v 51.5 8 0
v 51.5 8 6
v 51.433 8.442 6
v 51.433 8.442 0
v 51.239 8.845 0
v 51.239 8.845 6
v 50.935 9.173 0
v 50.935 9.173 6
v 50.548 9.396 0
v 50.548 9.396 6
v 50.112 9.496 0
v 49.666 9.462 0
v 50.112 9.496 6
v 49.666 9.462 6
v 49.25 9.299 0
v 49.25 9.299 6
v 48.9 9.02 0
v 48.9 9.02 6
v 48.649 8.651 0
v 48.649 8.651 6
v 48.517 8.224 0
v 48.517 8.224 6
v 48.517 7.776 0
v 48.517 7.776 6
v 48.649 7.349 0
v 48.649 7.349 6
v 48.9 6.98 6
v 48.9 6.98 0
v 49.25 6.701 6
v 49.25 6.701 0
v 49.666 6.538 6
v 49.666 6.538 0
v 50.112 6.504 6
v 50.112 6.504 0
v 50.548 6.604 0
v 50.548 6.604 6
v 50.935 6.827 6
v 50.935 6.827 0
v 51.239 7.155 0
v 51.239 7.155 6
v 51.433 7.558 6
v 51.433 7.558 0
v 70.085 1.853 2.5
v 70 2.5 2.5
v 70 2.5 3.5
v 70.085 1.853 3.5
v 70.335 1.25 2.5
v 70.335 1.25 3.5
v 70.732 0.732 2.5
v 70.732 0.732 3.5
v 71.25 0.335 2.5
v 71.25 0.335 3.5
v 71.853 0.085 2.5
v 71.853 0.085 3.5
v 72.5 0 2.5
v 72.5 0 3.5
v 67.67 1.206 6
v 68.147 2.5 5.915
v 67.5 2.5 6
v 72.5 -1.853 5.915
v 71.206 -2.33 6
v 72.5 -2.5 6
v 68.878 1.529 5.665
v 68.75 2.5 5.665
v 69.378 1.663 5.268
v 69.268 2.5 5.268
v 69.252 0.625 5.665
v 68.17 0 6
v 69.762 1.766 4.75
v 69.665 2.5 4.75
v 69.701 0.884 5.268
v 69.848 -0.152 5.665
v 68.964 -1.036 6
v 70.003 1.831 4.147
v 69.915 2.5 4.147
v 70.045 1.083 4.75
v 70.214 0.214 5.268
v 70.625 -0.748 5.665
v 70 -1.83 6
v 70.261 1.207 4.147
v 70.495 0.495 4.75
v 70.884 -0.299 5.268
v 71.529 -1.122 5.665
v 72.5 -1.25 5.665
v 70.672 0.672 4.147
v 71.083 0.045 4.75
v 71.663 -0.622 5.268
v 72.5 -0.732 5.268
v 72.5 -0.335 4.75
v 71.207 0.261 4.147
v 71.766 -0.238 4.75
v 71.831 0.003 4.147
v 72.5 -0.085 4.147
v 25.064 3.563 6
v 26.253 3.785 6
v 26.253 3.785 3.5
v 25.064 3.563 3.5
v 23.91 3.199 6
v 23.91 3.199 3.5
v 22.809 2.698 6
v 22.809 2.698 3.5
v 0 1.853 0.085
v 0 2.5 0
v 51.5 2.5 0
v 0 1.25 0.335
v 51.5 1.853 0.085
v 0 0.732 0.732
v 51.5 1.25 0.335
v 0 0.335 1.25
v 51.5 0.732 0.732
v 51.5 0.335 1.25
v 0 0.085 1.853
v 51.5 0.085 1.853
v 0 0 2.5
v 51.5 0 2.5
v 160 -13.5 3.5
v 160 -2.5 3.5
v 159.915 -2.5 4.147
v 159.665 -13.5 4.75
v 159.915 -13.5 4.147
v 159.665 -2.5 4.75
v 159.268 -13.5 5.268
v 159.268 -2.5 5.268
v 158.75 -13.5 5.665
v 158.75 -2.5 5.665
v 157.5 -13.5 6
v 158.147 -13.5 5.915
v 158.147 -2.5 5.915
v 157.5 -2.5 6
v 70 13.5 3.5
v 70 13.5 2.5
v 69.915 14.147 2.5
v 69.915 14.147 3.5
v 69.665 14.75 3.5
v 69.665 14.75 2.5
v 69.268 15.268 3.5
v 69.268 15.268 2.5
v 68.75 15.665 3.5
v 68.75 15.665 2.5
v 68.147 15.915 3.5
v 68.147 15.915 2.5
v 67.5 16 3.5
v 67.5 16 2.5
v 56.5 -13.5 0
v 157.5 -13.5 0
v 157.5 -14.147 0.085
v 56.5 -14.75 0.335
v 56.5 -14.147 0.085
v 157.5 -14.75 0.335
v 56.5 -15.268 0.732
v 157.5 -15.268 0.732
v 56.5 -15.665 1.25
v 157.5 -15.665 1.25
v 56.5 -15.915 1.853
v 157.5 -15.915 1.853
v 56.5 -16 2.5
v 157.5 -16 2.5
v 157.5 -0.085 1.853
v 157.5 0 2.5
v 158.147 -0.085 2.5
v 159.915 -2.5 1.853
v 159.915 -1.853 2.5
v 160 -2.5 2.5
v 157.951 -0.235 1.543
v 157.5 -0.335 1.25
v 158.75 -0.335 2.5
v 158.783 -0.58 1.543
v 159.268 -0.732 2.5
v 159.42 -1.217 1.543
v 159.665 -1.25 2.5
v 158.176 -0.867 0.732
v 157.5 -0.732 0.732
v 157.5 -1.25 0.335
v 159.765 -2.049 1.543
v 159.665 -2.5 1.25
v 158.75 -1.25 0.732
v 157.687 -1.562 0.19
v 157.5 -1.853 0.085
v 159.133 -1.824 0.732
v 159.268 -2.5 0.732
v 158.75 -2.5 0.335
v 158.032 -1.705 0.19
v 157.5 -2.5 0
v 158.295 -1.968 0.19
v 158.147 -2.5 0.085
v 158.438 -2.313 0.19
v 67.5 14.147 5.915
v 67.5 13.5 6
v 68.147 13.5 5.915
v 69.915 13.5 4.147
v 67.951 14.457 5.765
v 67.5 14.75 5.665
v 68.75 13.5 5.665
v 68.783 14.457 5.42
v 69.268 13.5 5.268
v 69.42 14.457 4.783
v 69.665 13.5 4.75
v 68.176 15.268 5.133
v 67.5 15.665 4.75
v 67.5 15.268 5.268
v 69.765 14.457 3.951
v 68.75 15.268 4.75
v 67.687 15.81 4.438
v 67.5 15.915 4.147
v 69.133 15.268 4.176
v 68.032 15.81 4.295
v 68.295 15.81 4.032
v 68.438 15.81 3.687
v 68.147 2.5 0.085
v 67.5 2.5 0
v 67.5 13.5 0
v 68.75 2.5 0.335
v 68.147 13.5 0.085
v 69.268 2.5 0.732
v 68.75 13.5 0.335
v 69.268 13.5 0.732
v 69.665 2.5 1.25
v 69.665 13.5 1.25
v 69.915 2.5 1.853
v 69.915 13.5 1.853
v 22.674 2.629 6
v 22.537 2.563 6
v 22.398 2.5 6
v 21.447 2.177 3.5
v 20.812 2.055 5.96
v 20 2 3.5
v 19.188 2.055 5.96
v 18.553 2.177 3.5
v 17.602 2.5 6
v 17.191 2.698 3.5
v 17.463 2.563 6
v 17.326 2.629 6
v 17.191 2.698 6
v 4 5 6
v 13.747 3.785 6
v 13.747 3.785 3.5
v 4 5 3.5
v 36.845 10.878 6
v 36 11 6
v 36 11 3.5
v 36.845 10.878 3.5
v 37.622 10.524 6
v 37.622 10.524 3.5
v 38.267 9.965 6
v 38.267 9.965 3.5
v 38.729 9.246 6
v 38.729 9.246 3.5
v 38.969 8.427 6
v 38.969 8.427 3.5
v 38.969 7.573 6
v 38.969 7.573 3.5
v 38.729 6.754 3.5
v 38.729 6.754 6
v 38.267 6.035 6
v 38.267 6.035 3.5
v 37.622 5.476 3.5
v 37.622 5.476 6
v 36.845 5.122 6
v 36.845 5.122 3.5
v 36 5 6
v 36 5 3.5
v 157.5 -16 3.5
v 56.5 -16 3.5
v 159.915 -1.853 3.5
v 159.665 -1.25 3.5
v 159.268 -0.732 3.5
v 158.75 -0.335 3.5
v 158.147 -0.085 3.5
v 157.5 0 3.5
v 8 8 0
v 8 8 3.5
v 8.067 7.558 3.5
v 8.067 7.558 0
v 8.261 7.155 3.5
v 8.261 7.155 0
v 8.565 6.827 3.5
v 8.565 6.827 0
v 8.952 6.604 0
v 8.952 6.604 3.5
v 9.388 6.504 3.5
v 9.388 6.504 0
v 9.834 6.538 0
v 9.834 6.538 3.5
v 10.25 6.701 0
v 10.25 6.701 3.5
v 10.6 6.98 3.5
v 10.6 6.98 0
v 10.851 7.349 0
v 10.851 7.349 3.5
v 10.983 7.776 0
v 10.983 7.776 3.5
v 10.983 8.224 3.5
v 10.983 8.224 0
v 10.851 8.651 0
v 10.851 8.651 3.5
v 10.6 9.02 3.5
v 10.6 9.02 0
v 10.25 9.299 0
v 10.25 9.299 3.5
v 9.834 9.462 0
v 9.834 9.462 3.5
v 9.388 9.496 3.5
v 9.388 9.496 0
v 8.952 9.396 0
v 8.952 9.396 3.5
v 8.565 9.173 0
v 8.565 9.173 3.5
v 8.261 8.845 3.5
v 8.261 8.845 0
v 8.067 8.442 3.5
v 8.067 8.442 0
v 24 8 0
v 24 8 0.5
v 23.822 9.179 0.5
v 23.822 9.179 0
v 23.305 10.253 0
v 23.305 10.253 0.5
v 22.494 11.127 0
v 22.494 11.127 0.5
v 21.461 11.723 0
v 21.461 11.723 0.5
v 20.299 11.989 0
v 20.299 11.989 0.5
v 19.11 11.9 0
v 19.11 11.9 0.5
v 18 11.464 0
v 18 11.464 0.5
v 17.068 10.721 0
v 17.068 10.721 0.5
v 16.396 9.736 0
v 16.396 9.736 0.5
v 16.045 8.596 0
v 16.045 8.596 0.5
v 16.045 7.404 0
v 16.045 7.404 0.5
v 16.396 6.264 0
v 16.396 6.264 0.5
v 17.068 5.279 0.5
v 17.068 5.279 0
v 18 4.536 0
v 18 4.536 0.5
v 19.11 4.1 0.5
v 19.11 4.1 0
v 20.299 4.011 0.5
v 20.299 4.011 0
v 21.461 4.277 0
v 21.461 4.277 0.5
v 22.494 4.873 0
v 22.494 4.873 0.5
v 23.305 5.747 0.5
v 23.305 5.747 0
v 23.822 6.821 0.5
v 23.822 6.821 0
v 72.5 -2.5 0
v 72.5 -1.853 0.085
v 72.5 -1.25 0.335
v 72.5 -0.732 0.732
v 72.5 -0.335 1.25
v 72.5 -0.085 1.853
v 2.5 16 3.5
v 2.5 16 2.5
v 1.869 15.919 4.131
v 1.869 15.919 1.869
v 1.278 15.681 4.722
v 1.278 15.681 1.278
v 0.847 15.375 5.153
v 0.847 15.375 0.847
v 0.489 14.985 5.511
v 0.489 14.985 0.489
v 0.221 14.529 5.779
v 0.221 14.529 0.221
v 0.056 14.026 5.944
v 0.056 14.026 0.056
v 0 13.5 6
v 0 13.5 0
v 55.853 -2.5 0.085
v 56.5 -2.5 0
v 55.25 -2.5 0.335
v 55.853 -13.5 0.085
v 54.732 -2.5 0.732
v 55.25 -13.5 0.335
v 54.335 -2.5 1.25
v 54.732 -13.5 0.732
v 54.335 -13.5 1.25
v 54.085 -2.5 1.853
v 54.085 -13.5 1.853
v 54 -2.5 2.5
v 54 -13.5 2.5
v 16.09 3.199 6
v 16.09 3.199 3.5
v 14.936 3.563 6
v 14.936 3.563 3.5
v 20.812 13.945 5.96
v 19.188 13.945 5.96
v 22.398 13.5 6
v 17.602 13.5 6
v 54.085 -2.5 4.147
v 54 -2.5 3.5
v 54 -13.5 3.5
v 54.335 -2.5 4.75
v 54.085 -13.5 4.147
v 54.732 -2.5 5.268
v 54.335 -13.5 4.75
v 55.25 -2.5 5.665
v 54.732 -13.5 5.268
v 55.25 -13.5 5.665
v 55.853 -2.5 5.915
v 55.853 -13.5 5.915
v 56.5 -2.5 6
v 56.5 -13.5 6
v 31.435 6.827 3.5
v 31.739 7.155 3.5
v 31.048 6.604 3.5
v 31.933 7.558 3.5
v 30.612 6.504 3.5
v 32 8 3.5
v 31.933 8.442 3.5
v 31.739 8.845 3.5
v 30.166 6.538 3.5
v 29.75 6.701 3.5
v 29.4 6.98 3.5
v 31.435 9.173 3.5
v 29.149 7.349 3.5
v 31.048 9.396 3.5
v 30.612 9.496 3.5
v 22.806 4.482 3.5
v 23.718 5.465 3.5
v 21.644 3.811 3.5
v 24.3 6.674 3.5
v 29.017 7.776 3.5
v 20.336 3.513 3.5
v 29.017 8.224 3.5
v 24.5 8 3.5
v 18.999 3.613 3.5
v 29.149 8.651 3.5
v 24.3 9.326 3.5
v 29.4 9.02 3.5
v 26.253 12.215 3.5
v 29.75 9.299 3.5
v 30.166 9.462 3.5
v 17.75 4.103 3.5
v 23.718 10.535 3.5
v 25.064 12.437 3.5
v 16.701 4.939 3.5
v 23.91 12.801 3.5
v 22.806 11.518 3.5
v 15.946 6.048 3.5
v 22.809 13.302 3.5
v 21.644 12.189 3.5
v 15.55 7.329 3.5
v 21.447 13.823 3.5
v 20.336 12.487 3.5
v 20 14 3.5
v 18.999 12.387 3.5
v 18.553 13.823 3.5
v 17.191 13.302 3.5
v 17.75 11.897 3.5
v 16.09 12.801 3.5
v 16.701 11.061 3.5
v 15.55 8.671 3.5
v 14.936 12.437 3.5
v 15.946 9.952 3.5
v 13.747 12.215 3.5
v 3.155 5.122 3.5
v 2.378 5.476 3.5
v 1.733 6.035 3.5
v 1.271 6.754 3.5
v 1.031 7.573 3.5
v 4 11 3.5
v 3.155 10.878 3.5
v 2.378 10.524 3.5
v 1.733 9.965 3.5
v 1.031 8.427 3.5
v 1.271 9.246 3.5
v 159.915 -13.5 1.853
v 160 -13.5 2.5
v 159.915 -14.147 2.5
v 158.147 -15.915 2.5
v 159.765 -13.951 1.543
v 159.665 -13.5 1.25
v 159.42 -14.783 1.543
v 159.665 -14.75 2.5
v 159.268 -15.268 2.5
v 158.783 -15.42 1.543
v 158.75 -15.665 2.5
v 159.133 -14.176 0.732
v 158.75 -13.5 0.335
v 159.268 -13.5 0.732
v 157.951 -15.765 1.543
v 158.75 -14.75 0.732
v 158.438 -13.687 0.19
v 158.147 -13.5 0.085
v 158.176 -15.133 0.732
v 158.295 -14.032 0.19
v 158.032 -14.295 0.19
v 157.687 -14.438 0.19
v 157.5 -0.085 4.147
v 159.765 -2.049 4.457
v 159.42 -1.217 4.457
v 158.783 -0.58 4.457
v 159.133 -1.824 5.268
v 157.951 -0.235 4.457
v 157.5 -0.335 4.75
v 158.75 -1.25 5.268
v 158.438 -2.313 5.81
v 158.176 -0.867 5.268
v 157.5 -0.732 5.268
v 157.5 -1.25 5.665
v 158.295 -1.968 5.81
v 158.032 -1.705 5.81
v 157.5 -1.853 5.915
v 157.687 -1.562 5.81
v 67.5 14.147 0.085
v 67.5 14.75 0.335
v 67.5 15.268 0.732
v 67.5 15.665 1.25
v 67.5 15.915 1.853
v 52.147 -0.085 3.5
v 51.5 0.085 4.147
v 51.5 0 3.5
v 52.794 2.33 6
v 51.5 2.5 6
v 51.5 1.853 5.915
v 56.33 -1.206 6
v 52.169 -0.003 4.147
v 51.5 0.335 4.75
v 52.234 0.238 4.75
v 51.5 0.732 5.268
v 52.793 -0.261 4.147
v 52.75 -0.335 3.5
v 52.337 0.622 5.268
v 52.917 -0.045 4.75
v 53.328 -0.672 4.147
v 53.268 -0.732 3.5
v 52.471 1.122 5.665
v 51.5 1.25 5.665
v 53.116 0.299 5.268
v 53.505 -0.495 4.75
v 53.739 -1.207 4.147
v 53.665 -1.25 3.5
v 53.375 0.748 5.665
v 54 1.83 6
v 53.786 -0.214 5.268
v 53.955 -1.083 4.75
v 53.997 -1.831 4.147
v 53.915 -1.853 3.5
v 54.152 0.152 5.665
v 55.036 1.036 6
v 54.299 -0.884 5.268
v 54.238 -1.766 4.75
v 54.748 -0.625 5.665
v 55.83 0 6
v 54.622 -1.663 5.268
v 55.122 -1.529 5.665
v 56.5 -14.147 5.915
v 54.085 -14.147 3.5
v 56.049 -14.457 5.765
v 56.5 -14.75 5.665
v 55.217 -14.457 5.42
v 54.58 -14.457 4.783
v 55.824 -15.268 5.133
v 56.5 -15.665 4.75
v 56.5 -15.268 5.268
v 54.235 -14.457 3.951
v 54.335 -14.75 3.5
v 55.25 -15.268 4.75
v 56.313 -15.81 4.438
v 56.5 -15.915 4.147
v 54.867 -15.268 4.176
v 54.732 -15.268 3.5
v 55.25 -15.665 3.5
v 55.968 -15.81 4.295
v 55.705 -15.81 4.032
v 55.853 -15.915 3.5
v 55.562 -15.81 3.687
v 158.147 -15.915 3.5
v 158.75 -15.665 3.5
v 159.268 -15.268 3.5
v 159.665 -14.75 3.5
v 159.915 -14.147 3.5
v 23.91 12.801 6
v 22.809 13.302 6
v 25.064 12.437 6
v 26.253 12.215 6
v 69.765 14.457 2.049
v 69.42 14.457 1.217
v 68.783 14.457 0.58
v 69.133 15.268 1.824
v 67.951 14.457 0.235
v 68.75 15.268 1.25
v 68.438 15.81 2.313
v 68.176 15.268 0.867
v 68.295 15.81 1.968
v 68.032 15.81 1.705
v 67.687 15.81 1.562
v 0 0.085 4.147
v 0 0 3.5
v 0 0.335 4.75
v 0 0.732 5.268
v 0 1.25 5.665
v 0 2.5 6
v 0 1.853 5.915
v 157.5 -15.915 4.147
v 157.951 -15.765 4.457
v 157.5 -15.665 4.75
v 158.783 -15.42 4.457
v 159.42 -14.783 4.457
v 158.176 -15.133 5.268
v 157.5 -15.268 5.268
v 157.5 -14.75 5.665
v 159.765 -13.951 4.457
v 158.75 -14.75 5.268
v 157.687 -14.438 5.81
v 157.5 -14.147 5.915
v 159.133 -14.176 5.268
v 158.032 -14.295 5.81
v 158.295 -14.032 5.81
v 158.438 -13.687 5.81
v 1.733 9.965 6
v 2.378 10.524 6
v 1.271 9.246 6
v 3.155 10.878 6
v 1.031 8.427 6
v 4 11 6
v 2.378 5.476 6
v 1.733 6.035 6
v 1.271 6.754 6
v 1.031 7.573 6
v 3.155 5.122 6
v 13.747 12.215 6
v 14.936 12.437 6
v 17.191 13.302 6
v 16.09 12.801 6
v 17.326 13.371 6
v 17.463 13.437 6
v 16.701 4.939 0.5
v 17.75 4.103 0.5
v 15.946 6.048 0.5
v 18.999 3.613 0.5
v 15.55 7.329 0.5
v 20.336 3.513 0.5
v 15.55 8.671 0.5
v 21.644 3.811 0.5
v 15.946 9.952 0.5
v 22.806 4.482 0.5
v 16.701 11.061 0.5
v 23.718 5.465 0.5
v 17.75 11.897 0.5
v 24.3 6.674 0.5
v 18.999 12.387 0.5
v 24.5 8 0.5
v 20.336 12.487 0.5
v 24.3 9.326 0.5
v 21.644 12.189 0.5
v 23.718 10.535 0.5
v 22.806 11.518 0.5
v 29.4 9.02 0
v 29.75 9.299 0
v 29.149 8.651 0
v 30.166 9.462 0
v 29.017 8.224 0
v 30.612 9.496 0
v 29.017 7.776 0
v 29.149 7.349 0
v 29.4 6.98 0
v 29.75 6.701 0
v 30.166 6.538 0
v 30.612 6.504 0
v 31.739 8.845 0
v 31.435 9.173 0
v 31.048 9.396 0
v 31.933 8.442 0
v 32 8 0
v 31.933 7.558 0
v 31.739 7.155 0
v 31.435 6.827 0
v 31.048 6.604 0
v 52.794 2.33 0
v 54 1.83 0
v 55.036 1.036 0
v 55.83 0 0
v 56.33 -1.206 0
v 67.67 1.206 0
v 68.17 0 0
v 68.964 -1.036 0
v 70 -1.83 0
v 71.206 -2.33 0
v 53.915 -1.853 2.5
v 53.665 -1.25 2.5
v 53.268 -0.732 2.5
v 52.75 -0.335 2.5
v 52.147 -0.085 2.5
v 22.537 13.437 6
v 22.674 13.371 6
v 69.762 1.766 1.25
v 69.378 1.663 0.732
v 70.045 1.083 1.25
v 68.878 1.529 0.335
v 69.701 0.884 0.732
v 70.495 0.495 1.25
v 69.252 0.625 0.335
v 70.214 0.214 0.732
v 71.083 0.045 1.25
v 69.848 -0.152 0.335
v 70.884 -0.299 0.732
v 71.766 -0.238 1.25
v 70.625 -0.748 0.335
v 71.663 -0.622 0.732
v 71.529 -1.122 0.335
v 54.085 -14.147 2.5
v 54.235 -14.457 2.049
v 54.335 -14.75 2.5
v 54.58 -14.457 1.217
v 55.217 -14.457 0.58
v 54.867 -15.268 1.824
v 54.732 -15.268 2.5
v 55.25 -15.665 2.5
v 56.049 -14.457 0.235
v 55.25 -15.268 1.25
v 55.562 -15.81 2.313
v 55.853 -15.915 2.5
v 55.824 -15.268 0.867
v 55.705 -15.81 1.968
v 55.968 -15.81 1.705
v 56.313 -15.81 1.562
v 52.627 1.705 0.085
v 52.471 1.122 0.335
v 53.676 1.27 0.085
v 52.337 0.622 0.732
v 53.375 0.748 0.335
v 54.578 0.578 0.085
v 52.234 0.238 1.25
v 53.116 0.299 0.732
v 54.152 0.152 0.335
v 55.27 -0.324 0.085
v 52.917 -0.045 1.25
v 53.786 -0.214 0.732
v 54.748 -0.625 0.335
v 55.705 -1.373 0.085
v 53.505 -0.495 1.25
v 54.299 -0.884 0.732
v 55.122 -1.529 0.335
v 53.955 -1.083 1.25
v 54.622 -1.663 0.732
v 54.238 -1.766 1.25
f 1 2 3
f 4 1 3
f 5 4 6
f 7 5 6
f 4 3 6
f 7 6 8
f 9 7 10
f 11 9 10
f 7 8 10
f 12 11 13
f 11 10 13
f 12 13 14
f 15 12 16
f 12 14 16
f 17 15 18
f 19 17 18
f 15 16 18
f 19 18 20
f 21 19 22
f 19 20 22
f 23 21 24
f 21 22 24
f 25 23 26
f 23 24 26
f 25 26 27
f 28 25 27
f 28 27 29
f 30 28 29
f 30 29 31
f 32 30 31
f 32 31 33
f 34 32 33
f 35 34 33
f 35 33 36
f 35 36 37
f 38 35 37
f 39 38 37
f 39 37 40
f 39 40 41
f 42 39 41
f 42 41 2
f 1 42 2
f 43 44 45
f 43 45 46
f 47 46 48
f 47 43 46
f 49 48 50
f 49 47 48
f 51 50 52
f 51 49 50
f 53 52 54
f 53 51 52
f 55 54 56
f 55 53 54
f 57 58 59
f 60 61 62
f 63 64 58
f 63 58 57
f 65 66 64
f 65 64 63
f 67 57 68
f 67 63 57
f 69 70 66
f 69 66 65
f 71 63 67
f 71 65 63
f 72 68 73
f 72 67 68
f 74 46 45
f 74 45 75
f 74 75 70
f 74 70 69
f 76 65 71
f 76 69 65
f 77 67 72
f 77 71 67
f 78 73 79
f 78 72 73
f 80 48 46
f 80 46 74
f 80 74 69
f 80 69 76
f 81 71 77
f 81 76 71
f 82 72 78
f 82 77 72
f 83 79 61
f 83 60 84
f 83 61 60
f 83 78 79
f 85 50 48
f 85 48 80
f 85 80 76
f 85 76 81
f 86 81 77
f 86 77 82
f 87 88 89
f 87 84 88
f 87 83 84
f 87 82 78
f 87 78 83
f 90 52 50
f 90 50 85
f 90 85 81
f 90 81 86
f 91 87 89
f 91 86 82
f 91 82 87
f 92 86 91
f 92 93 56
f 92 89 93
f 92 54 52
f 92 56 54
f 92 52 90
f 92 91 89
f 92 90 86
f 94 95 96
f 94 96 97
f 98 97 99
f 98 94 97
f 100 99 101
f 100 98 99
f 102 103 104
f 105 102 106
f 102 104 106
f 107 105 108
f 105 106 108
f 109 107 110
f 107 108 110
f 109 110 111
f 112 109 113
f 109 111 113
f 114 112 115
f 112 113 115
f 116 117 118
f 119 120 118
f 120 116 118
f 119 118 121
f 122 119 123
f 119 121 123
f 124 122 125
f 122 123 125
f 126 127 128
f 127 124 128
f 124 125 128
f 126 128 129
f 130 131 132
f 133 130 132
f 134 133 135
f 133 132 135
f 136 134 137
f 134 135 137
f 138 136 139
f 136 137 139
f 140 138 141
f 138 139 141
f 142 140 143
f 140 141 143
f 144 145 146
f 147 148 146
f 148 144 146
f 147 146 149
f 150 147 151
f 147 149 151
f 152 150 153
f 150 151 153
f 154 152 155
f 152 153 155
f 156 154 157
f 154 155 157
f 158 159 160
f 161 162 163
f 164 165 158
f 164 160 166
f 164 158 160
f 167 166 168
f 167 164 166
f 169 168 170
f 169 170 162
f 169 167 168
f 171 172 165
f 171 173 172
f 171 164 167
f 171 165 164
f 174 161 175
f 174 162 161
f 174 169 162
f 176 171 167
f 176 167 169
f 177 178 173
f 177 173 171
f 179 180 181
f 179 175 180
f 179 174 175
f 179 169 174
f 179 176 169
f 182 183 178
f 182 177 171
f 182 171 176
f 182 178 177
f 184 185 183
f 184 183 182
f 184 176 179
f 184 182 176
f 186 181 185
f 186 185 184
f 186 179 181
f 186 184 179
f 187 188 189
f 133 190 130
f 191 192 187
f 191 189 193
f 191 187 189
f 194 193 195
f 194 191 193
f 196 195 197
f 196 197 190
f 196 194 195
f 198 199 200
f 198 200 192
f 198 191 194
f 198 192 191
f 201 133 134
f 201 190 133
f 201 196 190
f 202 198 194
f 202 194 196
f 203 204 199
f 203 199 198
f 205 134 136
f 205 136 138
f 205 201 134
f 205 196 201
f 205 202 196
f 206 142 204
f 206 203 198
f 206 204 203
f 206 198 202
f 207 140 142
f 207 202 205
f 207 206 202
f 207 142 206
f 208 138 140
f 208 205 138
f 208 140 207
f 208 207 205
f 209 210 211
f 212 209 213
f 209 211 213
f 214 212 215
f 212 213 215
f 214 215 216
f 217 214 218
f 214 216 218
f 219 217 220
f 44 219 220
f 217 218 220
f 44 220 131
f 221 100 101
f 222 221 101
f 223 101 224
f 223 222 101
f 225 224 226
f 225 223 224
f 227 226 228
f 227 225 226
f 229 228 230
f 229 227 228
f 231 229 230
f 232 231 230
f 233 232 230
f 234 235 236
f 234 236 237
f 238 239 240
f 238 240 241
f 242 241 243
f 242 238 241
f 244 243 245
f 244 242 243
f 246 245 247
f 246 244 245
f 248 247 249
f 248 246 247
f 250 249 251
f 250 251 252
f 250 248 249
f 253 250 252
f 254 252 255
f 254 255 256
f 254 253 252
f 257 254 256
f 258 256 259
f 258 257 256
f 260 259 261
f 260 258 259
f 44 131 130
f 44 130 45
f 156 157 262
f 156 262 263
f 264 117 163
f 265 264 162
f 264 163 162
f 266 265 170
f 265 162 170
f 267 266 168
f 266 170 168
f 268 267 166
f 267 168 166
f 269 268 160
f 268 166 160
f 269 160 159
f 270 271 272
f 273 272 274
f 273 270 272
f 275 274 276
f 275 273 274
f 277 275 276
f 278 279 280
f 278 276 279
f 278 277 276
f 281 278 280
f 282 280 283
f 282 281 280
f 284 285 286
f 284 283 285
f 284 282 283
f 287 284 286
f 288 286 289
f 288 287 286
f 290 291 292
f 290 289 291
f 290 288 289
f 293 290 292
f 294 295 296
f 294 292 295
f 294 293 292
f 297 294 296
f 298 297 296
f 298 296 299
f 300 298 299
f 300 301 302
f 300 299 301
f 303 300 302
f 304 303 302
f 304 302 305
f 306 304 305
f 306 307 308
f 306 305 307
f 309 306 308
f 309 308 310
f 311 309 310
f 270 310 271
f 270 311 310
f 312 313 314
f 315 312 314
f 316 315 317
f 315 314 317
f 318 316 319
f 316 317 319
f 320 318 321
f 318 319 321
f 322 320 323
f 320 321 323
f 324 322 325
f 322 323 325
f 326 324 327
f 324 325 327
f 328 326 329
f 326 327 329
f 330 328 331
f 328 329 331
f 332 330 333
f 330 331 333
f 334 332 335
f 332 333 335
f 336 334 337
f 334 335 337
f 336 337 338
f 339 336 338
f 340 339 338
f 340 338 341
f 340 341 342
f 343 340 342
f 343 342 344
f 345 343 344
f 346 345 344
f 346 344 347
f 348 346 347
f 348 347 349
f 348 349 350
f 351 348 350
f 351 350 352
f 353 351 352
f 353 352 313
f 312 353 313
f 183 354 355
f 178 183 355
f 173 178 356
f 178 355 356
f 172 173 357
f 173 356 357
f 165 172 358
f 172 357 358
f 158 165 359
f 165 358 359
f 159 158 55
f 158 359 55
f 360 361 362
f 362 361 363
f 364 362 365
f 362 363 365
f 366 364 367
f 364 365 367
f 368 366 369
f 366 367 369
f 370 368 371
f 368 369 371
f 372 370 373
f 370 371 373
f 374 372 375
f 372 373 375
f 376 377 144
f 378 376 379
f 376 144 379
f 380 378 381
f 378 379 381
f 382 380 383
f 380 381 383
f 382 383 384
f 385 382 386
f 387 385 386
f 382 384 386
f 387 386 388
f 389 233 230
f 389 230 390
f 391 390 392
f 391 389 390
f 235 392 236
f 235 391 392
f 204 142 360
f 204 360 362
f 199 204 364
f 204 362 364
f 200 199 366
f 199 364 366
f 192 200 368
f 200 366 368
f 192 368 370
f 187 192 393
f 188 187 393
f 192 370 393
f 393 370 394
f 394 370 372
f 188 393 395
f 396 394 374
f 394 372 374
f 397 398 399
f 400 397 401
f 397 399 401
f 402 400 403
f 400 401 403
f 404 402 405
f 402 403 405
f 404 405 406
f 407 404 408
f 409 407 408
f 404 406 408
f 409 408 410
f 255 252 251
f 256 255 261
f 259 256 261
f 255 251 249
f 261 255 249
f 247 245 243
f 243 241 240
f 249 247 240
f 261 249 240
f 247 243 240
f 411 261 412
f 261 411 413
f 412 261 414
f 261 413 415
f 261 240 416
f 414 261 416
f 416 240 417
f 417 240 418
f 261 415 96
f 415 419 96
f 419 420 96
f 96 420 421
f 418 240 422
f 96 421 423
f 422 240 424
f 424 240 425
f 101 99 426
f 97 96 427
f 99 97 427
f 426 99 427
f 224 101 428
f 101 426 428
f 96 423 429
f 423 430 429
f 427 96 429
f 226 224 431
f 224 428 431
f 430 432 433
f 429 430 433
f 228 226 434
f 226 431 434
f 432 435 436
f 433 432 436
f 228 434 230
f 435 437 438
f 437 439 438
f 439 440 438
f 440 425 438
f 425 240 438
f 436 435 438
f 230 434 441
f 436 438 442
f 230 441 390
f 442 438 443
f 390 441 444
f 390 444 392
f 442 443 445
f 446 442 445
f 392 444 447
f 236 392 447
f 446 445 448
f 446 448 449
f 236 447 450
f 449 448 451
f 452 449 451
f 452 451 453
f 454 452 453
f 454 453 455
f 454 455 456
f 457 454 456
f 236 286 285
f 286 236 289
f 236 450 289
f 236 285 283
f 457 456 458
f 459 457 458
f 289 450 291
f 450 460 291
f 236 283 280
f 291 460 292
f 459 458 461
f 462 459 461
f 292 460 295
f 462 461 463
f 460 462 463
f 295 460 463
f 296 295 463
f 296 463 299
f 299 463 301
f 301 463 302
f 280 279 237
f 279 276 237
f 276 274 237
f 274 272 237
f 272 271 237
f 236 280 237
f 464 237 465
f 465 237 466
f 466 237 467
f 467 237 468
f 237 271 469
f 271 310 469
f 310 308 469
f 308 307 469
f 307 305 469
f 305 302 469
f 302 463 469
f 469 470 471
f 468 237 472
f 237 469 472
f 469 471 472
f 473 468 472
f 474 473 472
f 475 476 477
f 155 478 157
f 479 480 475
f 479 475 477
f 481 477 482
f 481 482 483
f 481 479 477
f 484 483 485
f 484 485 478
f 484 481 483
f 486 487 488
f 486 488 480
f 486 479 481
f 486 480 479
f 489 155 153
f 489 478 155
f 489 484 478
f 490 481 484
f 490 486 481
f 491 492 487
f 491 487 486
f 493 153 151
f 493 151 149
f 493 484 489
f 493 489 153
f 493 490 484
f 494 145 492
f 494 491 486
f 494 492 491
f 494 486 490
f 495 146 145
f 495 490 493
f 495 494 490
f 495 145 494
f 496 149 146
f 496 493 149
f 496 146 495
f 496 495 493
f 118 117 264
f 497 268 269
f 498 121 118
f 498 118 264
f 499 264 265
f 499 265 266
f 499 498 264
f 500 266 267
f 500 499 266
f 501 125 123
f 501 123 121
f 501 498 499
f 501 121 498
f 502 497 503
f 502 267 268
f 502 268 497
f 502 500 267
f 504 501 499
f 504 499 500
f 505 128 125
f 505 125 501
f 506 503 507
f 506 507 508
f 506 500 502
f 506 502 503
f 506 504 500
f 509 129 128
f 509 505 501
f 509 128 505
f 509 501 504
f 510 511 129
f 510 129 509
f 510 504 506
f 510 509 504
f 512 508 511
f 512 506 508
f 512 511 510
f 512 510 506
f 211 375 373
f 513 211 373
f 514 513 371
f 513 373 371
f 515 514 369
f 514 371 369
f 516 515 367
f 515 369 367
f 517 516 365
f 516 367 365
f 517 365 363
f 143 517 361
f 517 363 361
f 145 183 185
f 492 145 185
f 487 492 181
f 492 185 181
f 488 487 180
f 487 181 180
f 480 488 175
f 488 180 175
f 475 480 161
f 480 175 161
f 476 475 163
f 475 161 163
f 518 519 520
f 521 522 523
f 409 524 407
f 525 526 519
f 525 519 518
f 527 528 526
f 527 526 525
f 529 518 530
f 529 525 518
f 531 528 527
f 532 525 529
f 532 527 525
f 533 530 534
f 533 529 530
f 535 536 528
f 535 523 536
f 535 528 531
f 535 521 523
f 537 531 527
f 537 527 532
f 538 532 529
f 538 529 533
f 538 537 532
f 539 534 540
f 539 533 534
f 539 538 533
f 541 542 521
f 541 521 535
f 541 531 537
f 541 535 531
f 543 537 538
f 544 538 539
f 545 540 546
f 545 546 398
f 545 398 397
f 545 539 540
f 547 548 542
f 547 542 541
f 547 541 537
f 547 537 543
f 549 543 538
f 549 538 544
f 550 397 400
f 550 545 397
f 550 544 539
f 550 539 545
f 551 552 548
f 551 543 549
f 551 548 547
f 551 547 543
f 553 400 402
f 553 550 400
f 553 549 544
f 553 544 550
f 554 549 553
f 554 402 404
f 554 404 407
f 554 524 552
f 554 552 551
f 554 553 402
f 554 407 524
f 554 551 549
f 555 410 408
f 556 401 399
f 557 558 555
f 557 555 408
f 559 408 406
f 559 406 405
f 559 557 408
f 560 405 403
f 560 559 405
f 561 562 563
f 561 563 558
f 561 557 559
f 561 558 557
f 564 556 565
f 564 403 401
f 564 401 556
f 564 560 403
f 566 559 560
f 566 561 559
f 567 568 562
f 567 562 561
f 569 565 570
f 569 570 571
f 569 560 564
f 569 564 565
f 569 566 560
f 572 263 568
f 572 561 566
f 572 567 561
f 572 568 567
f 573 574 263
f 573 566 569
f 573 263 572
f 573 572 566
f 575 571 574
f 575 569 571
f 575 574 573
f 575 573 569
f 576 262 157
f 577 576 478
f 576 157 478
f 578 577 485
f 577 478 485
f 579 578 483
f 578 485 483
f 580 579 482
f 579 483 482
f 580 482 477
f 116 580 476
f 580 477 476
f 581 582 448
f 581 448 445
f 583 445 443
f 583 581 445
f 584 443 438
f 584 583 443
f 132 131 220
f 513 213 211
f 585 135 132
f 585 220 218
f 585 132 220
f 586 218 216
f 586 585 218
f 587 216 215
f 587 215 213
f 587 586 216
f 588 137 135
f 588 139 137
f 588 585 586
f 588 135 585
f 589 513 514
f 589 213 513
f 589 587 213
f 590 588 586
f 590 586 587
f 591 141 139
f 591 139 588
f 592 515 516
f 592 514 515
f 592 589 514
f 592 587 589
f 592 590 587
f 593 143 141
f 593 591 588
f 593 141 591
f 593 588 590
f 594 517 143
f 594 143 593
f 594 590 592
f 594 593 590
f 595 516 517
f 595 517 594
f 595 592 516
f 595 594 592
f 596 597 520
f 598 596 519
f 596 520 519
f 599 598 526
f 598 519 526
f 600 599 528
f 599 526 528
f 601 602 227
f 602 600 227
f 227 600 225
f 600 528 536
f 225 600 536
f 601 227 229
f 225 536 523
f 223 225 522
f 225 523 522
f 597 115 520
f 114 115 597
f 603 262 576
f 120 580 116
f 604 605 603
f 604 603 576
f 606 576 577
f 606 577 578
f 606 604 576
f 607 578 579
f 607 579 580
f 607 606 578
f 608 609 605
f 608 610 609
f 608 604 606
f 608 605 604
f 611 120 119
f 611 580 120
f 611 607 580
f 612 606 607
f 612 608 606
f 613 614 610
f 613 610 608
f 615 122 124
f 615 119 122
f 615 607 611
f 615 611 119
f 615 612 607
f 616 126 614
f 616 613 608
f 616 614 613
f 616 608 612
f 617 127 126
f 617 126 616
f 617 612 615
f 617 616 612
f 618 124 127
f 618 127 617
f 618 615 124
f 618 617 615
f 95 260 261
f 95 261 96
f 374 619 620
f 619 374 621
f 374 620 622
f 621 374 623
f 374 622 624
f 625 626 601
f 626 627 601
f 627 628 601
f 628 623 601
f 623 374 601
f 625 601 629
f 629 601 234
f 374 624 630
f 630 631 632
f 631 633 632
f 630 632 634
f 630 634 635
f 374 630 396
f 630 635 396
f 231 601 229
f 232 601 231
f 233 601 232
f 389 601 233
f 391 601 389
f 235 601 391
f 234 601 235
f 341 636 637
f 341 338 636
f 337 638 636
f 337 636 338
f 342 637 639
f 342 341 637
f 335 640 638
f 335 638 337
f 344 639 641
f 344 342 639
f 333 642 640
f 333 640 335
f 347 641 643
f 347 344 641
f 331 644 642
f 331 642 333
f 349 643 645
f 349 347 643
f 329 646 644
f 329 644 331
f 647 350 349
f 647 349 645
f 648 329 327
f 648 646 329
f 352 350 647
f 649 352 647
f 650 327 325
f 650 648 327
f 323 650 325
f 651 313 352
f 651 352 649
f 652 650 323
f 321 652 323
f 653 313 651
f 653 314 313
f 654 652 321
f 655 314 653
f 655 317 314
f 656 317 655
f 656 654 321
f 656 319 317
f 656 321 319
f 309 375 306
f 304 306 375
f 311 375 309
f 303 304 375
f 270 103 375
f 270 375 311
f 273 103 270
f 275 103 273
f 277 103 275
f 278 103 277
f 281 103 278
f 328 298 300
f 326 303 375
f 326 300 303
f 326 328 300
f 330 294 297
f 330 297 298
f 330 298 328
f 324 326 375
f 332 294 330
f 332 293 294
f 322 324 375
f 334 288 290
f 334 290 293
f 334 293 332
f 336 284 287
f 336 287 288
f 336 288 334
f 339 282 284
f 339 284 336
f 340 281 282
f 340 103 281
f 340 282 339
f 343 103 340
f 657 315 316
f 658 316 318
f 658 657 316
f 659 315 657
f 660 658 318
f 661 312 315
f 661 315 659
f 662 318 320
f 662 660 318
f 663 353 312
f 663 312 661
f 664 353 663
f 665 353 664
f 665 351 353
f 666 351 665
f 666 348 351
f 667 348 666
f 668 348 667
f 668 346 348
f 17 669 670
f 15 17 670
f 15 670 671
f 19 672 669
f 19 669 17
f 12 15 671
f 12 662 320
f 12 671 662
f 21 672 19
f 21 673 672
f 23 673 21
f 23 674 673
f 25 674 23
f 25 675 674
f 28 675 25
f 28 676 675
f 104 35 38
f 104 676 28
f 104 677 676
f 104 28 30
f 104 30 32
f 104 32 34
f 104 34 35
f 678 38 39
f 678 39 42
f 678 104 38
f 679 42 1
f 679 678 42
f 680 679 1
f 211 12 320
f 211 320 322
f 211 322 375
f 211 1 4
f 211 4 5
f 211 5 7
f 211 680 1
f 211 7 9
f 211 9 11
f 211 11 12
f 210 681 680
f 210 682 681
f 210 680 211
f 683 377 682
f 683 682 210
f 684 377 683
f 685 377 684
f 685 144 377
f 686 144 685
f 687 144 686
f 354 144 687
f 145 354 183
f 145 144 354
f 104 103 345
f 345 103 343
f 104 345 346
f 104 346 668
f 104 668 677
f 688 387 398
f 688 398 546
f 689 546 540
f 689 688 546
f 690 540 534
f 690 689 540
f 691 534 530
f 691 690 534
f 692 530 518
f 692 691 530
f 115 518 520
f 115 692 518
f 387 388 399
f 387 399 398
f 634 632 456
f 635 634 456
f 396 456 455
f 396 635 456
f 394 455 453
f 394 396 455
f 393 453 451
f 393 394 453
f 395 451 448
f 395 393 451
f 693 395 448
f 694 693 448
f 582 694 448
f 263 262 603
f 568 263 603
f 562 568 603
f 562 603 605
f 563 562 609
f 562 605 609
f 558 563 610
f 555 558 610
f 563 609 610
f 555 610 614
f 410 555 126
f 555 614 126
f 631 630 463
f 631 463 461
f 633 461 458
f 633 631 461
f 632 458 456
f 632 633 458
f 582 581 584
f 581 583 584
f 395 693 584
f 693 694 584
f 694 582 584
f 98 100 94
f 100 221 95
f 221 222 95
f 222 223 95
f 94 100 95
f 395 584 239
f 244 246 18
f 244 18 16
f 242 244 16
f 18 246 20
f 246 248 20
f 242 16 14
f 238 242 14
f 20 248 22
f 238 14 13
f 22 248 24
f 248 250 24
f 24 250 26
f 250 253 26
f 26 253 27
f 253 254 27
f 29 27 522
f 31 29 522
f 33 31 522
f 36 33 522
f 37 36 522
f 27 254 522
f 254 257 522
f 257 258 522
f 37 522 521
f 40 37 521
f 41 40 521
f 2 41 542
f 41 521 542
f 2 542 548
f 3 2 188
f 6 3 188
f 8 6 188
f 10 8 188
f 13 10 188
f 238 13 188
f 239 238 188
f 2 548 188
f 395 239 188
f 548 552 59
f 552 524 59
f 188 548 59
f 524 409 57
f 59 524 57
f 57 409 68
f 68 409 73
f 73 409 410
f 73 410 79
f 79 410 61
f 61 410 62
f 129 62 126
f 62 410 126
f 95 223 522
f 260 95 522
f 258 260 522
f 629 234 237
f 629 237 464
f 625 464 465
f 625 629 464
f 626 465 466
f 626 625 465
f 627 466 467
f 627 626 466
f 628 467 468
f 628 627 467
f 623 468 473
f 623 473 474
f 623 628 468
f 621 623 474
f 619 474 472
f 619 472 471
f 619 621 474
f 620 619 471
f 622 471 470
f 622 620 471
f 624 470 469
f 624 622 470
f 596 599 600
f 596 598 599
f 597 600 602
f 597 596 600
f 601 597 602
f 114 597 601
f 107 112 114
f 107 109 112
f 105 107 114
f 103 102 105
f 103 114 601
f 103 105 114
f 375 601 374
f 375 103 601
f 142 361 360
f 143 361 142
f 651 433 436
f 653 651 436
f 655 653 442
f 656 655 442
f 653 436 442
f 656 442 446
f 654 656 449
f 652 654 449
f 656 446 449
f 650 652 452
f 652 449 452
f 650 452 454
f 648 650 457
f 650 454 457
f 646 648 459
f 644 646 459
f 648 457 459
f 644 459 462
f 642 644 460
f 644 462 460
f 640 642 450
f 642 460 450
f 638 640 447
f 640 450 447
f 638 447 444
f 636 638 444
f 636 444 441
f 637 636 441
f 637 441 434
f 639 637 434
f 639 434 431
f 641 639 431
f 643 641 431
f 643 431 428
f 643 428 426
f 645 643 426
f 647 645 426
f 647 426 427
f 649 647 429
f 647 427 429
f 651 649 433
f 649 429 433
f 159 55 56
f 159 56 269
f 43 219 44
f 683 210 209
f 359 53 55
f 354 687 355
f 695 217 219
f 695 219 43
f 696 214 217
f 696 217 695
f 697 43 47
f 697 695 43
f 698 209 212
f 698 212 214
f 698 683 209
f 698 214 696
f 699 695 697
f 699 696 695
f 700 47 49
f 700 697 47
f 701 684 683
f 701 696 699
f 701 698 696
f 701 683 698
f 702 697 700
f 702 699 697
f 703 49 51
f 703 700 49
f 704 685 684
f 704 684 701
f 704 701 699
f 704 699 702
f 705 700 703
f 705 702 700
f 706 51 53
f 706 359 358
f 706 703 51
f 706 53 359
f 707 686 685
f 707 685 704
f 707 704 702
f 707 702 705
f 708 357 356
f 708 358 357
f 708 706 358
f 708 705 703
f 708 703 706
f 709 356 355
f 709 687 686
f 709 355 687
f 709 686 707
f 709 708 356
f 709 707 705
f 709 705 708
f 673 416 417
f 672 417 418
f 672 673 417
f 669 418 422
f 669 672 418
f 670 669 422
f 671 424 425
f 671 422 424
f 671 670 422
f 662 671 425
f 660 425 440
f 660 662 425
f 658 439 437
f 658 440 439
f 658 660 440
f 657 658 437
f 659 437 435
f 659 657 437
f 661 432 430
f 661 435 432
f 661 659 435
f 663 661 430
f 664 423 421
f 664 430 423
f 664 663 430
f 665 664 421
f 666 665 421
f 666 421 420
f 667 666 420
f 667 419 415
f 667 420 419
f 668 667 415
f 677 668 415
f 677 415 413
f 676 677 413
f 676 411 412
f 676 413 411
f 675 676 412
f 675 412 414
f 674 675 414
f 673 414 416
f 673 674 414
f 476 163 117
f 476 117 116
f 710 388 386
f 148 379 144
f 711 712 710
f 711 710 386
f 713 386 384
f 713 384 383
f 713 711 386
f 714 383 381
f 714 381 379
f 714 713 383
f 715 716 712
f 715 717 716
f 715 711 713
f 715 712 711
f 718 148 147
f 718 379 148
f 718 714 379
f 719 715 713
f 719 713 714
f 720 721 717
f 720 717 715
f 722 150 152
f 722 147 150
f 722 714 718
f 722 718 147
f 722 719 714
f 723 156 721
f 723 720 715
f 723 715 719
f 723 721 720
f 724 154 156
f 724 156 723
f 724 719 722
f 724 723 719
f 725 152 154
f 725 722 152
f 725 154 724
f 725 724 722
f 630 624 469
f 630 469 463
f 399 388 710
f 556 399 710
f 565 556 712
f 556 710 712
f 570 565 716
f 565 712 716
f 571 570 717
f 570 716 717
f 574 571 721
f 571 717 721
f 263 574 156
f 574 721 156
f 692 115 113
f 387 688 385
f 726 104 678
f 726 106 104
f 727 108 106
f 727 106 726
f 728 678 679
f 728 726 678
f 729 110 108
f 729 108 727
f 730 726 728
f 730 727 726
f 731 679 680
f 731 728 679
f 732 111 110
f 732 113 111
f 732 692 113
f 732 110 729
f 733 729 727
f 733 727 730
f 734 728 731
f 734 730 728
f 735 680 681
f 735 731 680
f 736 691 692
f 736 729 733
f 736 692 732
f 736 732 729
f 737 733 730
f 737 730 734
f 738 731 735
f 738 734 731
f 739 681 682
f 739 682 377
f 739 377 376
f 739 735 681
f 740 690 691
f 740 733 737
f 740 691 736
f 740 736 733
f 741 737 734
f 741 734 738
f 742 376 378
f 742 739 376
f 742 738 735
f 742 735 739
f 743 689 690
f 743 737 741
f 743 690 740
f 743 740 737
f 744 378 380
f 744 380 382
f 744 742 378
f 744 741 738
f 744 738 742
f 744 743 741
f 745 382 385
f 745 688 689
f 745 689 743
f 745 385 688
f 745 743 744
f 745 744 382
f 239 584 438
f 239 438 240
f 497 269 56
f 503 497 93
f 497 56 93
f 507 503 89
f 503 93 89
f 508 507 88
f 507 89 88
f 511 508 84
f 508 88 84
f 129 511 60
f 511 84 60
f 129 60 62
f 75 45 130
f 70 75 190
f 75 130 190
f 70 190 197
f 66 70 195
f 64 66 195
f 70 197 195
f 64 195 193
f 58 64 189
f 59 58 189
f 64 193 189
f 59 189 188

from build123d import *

# Parameters (mm, degrees)
SKETCH_1_R          = 1.5
EXTRUDE_1_DEPTH     = 6
CUT_EXTRUDE_3_DEPTH = 2.5
SKETCH_5_R          = 4.5
CUT_EXTRUDE_4_DEPTH = 3
SKETCH_6_R          = 4
CUT_EXTRUDE_5_DEPTH = 3
SKETCH_7_R          = 1.5
CUT_EXTRUDE_6_DEPTH = 43
FILLET_1_R          = 2.5
FILLET_2_R          = 2.5


with BuildPart() as part:
    # Эскиз1 → Бобышка-Вытянуть1 (new body)
    with BuildSketch(Plane.XY):
        Polygon((0, 0), (0, 16), (70, 16), (70, 0), (160, 0), (160, -16), (54, -16), (54, 0), align=None)
        with Locations((20, 8)):
            Circle(SKETCH_1_R, mode=Mode.SUBTRACT)
        with Locations((30.5, 8)):
            Circle(SKETCH_1_R, mode=Mode.SUBTRACT)
        with Locations(Location((9.5, 8, 0), (0, 0, 180))):
            Circle(SKETCH_1_R, mode=Mode.SUBTRACT)
    extrude(amount=EXTRUDE_1_DEPTH)

    # Эскиз4 → Вырез-Вытянуть3 (cut)
    with BuildSketch(Plane.XY.offset(6)):
        with BuildLine():
            Line((4, 11), (13.746665091, 12.215156208))
            ThreePointArc((13.746665091, 12.215156208), (15.51833306, 12.60172211), (17.191063441, 13.301874707))
            ThreePointArc((17.191063441, 13.301874707), (20, 14), (22.808936559, 13.301874707))
            ThreePointArc((22.808936559, 13.301874707), (24.48166694, 12.60172211), (26.253334909, 12.215156208))
            Line((26.253334909, 12.215156208), (36, 11))
            ThreePointArc((36, 11), (39, 8), (36, 5))
            Line((36, 5), (26.253334909, 3.784843792))
            ThreePointArc((26.253334909, 3.784843792), (24.48166694, 3.39827789), (22.808936559, 2.698125293))
            ThreePointArc((22.808936559, 2.698125293), (20, 2), (17.191063441, 2.698125293))
            ThreePointArc((17.191063441, 2.698125293), (15.51833306, 3.39827789), (13.746665091, 3.784843792))
            Line((13.746665091, 3.784843792), (4, 5))
            ThreePointArc((4, 5), (1, 8), (4, 11))
        make_face()
    extrude(amount=-CUT_EXTRUDE_3_DEPTH, mode=Mode.SUBTRACT)

    # Эскиз5 → Вырез-Вытянуть4 (cut)
    with BuildSketch(Plane.XY.offset(3.5)):
        with Locations((20, 8)):
            Circle(SKETCH_5_R)
    extrude(amount=-CUT_EXTRUDE_4_DEPTH, mode=Mode.SUBTRACT)

    # Эскиз6 → Вырез-Вытянуть5 (cut)
    with BuildSketch(Plane.XY.offset(0.5)):
        with Locations((20, 8)):
            Circle(SKETCH_6_R)
    extrude(amount=-CUT_EXTRUDE_5_DEPTH, mode=Mode.SUBTRACT)

    # Эскиз7 → Вырез-Вытянуть6 (cut)
    with BuildSketch(Plane.XY.offset(6)):
        with Locations((50, 8)):
            Circle(SKETCH_7_R)
        with Locations((80, 8)):
            Circle(SKETCH_7_R)
        with Locations((110, 8)):
            Circle(SKETCH_7_R)
        with Locations((140, 8)):
            Circle(SKETCH_7_R)
        with Locations((170, 8)):
            Circle(SKETCH_7_R)
    extrude(amount=-CUT_EXTRUDE_6_DEPTH, mode=Mode.SUBTRACT)

    # Скругление1
    # the kernel refuses this fillet: 2.5 mm, written as the material it adds along each edge
    with BuildSketch(Plane(origin=(70, 0, 0), x_dir=(0, 1, 0), z_dir=(0, 0, 1))) as fillet_1_piece_1:
        with BuildLine():
            CenterArc((FILLET_1_R, -FILLET_1_R), FILLET_1_R, 90, 90)
            Line((0, -FILLET_1_R), (0, 0))
            Line((0, 0), (FILLET_1_R, 0))
        make_face()
    extrude(amount=6)
    with BuildSketch(Plane(origin=(54, 0, 0), x_dir=(-1, 0, 0), z_dir=(0, 0, 1))) as fillet_1_piece_2:
        with BuildLine():
            CenterArc((FILLET_1_R, FILLET_1_R), FILLET_1_R, 180, 90)
            Line((0, FILLET_1_R), (0, 0))
            Line((0, 0), (FILLET_1_R, 0))
        make_face()
    extrude(amount=6)
    # the kernel refuses this fillet: 2.5 mm, written as the material it takes off along each edge
    with BuildSketch(Plane(origin=(56.5, -13.5, 2.5), x_dir=(0, 0, -1), z_dir=(0, -1, 0))) as fillet_1_2_piece_1_section:
        Polygon((0, 0), (FILLET_1_R, 0), (FILLET_1_R, -FILLET_1_R), (0, -FILLET_1_R), align=None)
    fillet_1_2_piece_1 = extrude(amount=FILLET_1_R, mode=Mode.PRIVATE)
    fillet_1_2_piece_1 = fillet_1_2_piece_1 - Plane(origin=(56.5, -13.5, 2.5), x_dir=(0.7071067811865475, 0, 0.7071067811865475), z_dir=(0, -1, 0)) * Sphere(FILLET_1_R, mode=Mode.PRIVATE)
    add(fillet_1_2_piece_1, mode=Mode.SUBTRACT)
    with BuildSketch(Plane(origin=(56.5, -13.5, 3.5), x_dir=(0, 0, 1), z_dir=(0, -1, 0))) as fillet_1_2_piece_2_section:
        Polygon((0, 0), (FILLET_1_R, 0), (FILLET_1_R, FILLET_1_R), (0, FILLET_1_R), align=None)
    fillet_1_2_piece_2 = extrude(amount=FILLET_1_R, mode=Mode.PRIVATE)
    fillet_1_2_piece_2 = fillet_1_2_piece_2 - Plane(origin=(56.5, -13.5, 3.5), x_dir=(0.7071067811865475, 0, -0.7071067811865475), z_dir=(0, -1, 0)) * Sphere(FILLET_1_R, mode=Mode.PRIVATE)
    add(fillet_1_2_piece_2, mode=Mode.SUBTRACT)
    with BuildSketch(Plane(origin=(67.5, 13.5, 2.5), x_dir=(0, 0, -1), z_dir=(0, 1, 0))) as fillet_1_2_piece_3_section:
        Polygon((0, 0), (FILLET_1_R, 0), (FILLET_1_R, -FILLET_1_R), (0, -FILLET_1_R), align=None)
    fillet_1_2_piece_3 = extrude(amount=FILLET_1_R, mode=Mode.PRIVATE)
    fillet_1_2_piece_3 = fillet_1_2_piece_3 - Plane(origin=(67.5, 13.5, 2.5), x_dir=(-0.7071067811865475, 0, 0.7071067811865475), z_dir=(0, 1, 0)) * Sphere(FILLET_1_R, mode=Mode.PRIVATE)
    add(fillet_1_2_piece_3, mode=Mode.SUBTRACT)
    with BuildSketch(Plane(origin=(67.5, 13.5, 3.5), x_dir=(0, 0, 1), z_dir=(0, 1, 0))) as fillet_1_2_piece_4_section:
        Polygon((0, 0), (FILLET_1_R, 0), (FILLET_1_R, FILLET_1_R), (0, FILLET_1_R), align=None)
    fillet_1_2_piece_4 = extrude(amount=FILLET_1_R, mode=Mode.PRIVATE)
    fillet_1_2_piece_4 = fillet_1_2_piece_4 - Plane(origin=(67.5, 13.5, 3.5), x_dir=(-0.7071067811865475, 0, -0.7071067811865475), z_dir=(0, 1, 0)) * Sphere(FILLET_1_R, mode=Mode.PRIVATE)
    add(fillet_1_2_piece_4, mode=Mode.SUBTRACT)
    with BuildSketch(Plane(origin=(166.25, -16, 0), x_dir=(0, 1, 0), z_dir=(-1, 0, 0))) as fillet_1_2_piece_5:
        with BuildLine():
            CenterArc((FILLET_1_R, -FILLET_1_R), FILLET_1_R, 90, 90)
            Line((0, -FILLET_1_R), (0, 0))
            Line((0, 0), (FILLET_1_R, 0))
        make_face()
    extrude(amount=109.75, mode=Mode.SUBTRACT)
    with BuildSketch(Plane(origin=(54, -13.5, 0), x_dir=(1, 0, 0), z_dir=(0, 1, 0)), Plane(origin=(70, 13.5, 0), x_dir=(-1, 0, 0), z_dir=(0, -1, 0))) as fillet_1_2_piece_6:
        with BuildLine():
            CenterArc((FILLET_1_R, -FILLET_1_R), FILLET_1_R, 90, 90)
            Line((0, -FILLET_1_R), (0, 0))
            Line((0, 0), (FILLET_1_R, 0))
        make_face()
    extrude(amount=11, mode=Mode.SUBTRACT)
    with BuildSketch(Plane(origin=(51.5, 0, 0), x_dir=(0, 0, 1), z_dir=(-1, 0, 0))) as fillet_1_2_piece_7:
        with BuildLine():
            CenterArc((FILLET_1_R, FILLET_1_R), FILLET_1_R, 180, 90)
            Line((0, FILLET_1_R), (0, 0))
            Line((0, 0), (FILLET_1_R, 0))
        make_face()
    extrude(amount=57.75, mode=Mode.SUBTRACT)
    with BuildSketch(Plane(origin=(166.25, -16, 6), x_dir=(0, 1, 0), z_dir=(-1, 0, 0))) as fillet_1_2_piece_8:
        with BuildLine():
            CenterArc((FILLET_1_R, FILLET_1_R), FILLET_1_R, 180, 90)
            Line((0, FILLET_1_R), (0, 0))
            Line((0, 0), (FILLET_1_R, 0))
        make_face()
    extrude(amount=109.75, mode=Mode.SUBTRACT)
    with BuildSketch(Plane(origin=(0, 16, -6.25), x_dir=(0, -1, 0), z_dir=(0, 0, 1)), Plane(origin=(160, 0, -6.25), x_dir=(-1, 0, 0), z_dir=(0, 0, 1))) as fillet_1_2_piece_9:
        with BuildLine():
            CenterArc((FILLET_1_R, FILLET_1_R), FILLET_1_R, 180, 90)
            Line((0, FILLET_1_R), (0, 0))
            Line((0, 0), (FILLET_1_R, 0))
        make_face()
    extrude(amount=18.5, mode=Mode.SUBTRACT)
    with BuildSketch(Plane(origin=(70, 16, 2.5), x_dir=(-1, 0, 0), z_dir=(0, 0, 1))) as fillet_1_2_piece_10:
        with BuildLine():
            CenterArc((FILLET_1_R, FILLET_1_R), FILLET_1_R, 180, 90)
            Line((0, FILLET_1_R), (0, 0))
            Line((0, 0), (FILLET_1_R, 0))
        make_face()
    extrude(amount=1, mode=Mode.SUBTRACT)
    with BuildSketch(Plane(origin=(160, -16, -6.25), x_dir=(-1, 0, 0), z_dir=(0, 0, 1))) as fillet_1_2_piece_11:
        with BuildLine():
            CenterArc((FILLET_1_R, -FILLET_1_R), FILLET_1_R, 90, 90)
            Line((0, -FILLET_1_R), (0, 0))
            Line((0, 0), (FILLET_1_R, 0))
        make_face()
    extrude(amount=18.5, mode=Mode.SUBTRACT)
    with BuildSketch(Plane(origin=(54, -16, 2.5), x_dir=(0, 1, 0), z_dir=(0, 0, 1))) as fillet_1_2_piece_12:
        with BuildLine():
            CenterArc((FILLET_1_R, -FILLET_1_R), FILLET_1_R, 90, 90)
            Line((0, -FILLET_1_R), (0, 0))
            Line((0, 0), (FILLET_1_R, 0))
        make_face()
    extrude(amount=1, mode=Mode.SUBTRACT)
    with BuildSketch(Plane(origin=(72.5, 0, 6), x_dir=(0, -1, 0), z_dir=(1, 0, 0))) as fillet_1_2_piece_13:
        with BuildLine():
            CenterArc((FILLET_1_R, FILLET_1_R), FILLET_1_R, 180, 90)
            Line((0, FILLET_1_R), (0, 0))
            Line((0, 0), (FILLET_1_R, 0))
        make_face()
    extrude(amount=93.75, mode=Mode.SUBTRACT)
    with BuildSketch(Plane(origin=(70, 13.5, 6), x_dir=(-1, 0, 0), z_dir=(0, -1, 0)), Plane(origin=(54, -13.5, 6), x_dir=(1, 0, 0), z_dir=(0, 1, 0))) as fillet_1_2_piece_14:
        with BuildLine():
            CenterArc((FILLET_1_R, FILLET_1_R), FILLET_1_R, 180, 90)
            Line((0, FILLET_1_R), (0, 0))
            Line((0, 0), (FILLET_1_R, 0))
        make_face()
    extrude(amount=11, mode=Mode.SUBTRACT)
    with BuildSketch(Plane(origin=(-6.25, 16, 6), x_dir=(0, 0, -1), z_dir=(1, 0, 0))) as fillet_1_2_piece_15:
        with BuildLine():
            CenterArc((FILLET_1_R, -FILLET_1_R), FILLET_1_R, 90, 90)
            Line((0, -FILLET_1_R), (0, 0))
            Line((0, 0), (FILLET_1_R, 0))
        make_face()
    extrude(amount=73.75, mode=Mode.SUBTRACT)
    with BuildSketch(Plane(origin=(51.5, 0, 6), x_dir=(0, 0, -1), z_dir=(-1, 0, 0))) as fillet_1_2_piece_16:
        with BuildLine():
            CenterArc((FILLET_1_R, -FILLET_1_R), FILLET_1_R, 90, 90)
            Line((0, -FILLET_1_R), (0, 0))
            Line((0, 0), (FILLET_1_R, 0))
        make_face()
    extrude(amount=57.75, mode=Mode.SUBTRACT)
    with BuildSketch(Plane(origin=(-6.25, 16, 0), x_dir=(0, 0, 1), z_dir=(1, 0, 0))) as fillet_1_2_piece_17:
        with BuildLine():
            CenterArc((FILLET_1_R, FILLET_1_R), FILLET_1_R, 180, 90)
            Line((0, FILLET_1_R), (0, 0))
            Line((0, 0), (FILLET_1_R, 0))
        make_face()
    extrude(amount=73.75, mode=Mode.SUBTRACT)
    with BuildSketch(Plane(origin=(72.5, 0, 0), x_dir=(0, -1, 0), z_dir=(1, 0, 0))) as fillet_1_2_piece_18:
        with BuildLine():
            CenterArc((FILLET_1_R, -FILLET_1_R), FILLET_1_R, 90, 90)
            Line((0, -FILLET_1_R), (0, 0))
            Line((0, 0), (FILLET_1_R, 0))
        make_face()
    extrude(amount=93.75, mode=Mode.SUBTRACT)
    with BuildSketch(Plane(origin=(72.5, 2.5, 0), x_dir=(-1, 0, 0), z_dir=(0, 1, 0))) as fillet_1_2_piece_19:
        with BuildLine():
            CenterArc((2.5 + FILLET_1_R, FILLET_1_R), FILLET_1_R, 180, 90)
            Line((2.5, FILLET_1_R), (2.5, 0))
            Line((2.5, 0), (2.5 + FILLET_1_R, 0))
        make_face()
    revolve(axis=Axis((72.5, 2.5, 0), (0, 0, 1)), revolution_arc=90, mode=Mode.SUBTRACT)
    with BuildSketch(Plane(origin=(51.5, -2.5, 6), x_dir=(0, 1, 0), z_dir=(-1, 0, 0))) as fillet_1_2_piece_20:
        with BuildLine():
            CenterArc((2.5 + FILLET_1_R, FILLET_1_R), FILLET_1_R, 180, 90)
            Line((2.5, FILLET_1_R), (2.5, 0))
            Line((2.5, 0), (2.5 + FILLET_1_R, 0))
        make_face()
    revolve(axis=Axis((51.5, -2.5, 6), (0, 0, -1)), revolution_arc=90, mode=Mode.SUBTRACT)
    with BuildSketch(Plane(origin=(72.5, 2.5, 6), x_dir=(-1, 0, 0), z_dir=(0, 1, 0))) as fillet_1_2_piece_21:
        with BuildLine():
            CenterArc((2.5 + FILLET_1_R, -FILLET_1_R), FILLET_1_R, 90, 90)
            Line((2.5, -FILLET_1_R), (2.5, 0))
            Line((2.5, 0), (2.5 + FILLET_1_R, 0))
        make_face()
    revolve(axis=Axis((72.5, 2.5, 6), (0, 0, 1)), revolution_arc=90, mode=Mode.SUBTRACT)
    with BuildSketch(Plane(origin=(51.5, -2.5, 0), x_dir=(0, 1, 0), z_dir=(-1, 0, 0))) as fillet_1_2_piece_22:
        with BuildLine():
            CenterArc((2.5 + FILLET_1_R, -FILLET_1_R), FILLET_1_R, 90, 90)
            Line((2.5, -FILLET_1_R), (2.5, 0))
            Line((2.5, 0), (2.5 + FILLET_1_R, 0))
        make_face()
    revolve(axis=Axis((51.5, -2.5, 0), (0, 0, -1)), revolution_arc=90, mode=Mode.SUBTRACT)

    # Скругление2
    # the kernel refuses this fillet: 2.5 mm, written as the material it takes off along each edge
    with BuildSketch(Plane(origin=(157.5, -13.5, 2.5), x_dir=(1, 0, 0), z_dir=(0, 0, -1))) as fillet_2_piece_1_section:
        Polygon((0, 0), (FILLET_2_R, 0), (FILLET_2_R, FILLET_2_R), (0, FILLET_2_R), align=None)
    fillet_2_piece_1 = extrude(amount=FILLET_2_R, mode=Mode.PRIVATE)
    fillet_2_piece_1 = fillet_2_piece_1 - Plane(origin=(157.5, -13.5, 2.5), x_dir=(-0.707106781186548, 0.707106781186547, 0), z_dir=(0, 0, -1)) * Sphere(FILLET_2_R, mode=Mode.PRIVATE)
    add(fillet_2_piece_1, mode=Mode.SUBTRACT)
    with BuildSketch(Plane(origin=(157.5, -13.5, 3.5), x_dir=(1, 0, 0), z_dir=(0, 0, 1))) as fillet_2_piece_2_section:
        Polygon((0, 0), (FILLET_2_R, 0), (FILLET_2_R, -FILLET_2_R), (0, -FILLET_2_R), align=None)
    fillet_2_piece_2 = extrude(amount=FILLET_2_R, mode=Mode.PRIVATE)
    fillet_2_piece_2 = fillet_2_piece_2 - Plane(origin=(157.5, -13.5, 3.5), x_dir=(-0.707106781186548, 0.707106781186547, 0), z_dir=(0, 0, 1)) * Sphere(FILLET_2_R, mode=Mode.PRIVATE)
    add(fillet_2_piece_2, mode=Mode.SUBTRACT)
    with BuildSketch(Plane(origin=(157.5, -2.5, 2.5), x_dir=(1, 0, 0), z_dir=(0, 0, -1))) as fillet_2_piece_3_section:
        Polygon((0, 0), (FILLET_2_R, 0), (FILLET_2_R, -FILLET_2_R), (0, -FILLET_2_R), align=None)
    fillet_2_piece_3 = extrude(amount=FILLET_2_R, mode=Mode.PRIVATE)
    fillet_2_piece_3 = fillet_2_piece_3 - Plane(origin=(157.5, -2.5, 2.5), x_dir=(-0.707106781186547, -0.7071067811865479, 0), z_dir=(0, 0, -1)) * Sphere(FILLET_2_R, mode=Mode.PRIVATE)
    add(fillet_2_piece_3, mode=Mode.SUBTRACT)
    with BuildSketch(Plane(origin=(157.5, -2.5, 3.5), x_dir=(1, 0, 0), z_dir=(0, 0, 1))) as fillet_2_piece_4_section:
        Polygon((0, 0), (FILLET_2_R, 0), (FILLET_2_R, FILLET_2_R), (0, FILLET_2_R), align=None)
    fillet_2_piece_4 = extrude(amount=FILLET_2_R, mode=Mode.PRIVATE)
    fillet_2_piece_4 = fillet_2_piece_4 - Plane(origin=(157.5, -2.5, 3.5), x_dir=(-0.707106781186547, -0.7071067811865479, 0), z_dir=(0, 0, 1)) * Sphere(FILLET_2_R, mode=Mode.PRIVATE)
    add(fillet_2_piece_4, mode=Mode.SUBTRACT)
    with BuildSketch(Plane(origin=(160, -2.5, 6), x_dir=(-1, 0, 0), z_dir=(0, -1, 0))) as fillet_2_piece_5:
        with BuildLine():
            CenterArc((FILLET_2_R, FILLET_2_R), FILLET_2_R, 180, 90)
            Line((0, FILLET_2_R), (0, 0))
            Line((0, 0), (FILLET_2_R, 0))
        make_face()
    extrude(amount=11, mode=Mode.SUBTRACT)
    with BuildSketch(Plane(origin=(160, -2.5, 0), x_dir=(-1, 0, 0), z_dir=(0, -1, 0))) as fillet_2_piece_6:
        with BuildLine():
            CenterArc((FILLET_2_R, -FILLET_2_R), FILLET_2_R, 90, 90)
            Line((0, -FILLET_2_R), (0, 0))
            Line((0, 0), (FILLET_2_R, 0))
        make_face()
    extrude(amount=11, mode=Mode.SUBTRACT)


solid = part.part
